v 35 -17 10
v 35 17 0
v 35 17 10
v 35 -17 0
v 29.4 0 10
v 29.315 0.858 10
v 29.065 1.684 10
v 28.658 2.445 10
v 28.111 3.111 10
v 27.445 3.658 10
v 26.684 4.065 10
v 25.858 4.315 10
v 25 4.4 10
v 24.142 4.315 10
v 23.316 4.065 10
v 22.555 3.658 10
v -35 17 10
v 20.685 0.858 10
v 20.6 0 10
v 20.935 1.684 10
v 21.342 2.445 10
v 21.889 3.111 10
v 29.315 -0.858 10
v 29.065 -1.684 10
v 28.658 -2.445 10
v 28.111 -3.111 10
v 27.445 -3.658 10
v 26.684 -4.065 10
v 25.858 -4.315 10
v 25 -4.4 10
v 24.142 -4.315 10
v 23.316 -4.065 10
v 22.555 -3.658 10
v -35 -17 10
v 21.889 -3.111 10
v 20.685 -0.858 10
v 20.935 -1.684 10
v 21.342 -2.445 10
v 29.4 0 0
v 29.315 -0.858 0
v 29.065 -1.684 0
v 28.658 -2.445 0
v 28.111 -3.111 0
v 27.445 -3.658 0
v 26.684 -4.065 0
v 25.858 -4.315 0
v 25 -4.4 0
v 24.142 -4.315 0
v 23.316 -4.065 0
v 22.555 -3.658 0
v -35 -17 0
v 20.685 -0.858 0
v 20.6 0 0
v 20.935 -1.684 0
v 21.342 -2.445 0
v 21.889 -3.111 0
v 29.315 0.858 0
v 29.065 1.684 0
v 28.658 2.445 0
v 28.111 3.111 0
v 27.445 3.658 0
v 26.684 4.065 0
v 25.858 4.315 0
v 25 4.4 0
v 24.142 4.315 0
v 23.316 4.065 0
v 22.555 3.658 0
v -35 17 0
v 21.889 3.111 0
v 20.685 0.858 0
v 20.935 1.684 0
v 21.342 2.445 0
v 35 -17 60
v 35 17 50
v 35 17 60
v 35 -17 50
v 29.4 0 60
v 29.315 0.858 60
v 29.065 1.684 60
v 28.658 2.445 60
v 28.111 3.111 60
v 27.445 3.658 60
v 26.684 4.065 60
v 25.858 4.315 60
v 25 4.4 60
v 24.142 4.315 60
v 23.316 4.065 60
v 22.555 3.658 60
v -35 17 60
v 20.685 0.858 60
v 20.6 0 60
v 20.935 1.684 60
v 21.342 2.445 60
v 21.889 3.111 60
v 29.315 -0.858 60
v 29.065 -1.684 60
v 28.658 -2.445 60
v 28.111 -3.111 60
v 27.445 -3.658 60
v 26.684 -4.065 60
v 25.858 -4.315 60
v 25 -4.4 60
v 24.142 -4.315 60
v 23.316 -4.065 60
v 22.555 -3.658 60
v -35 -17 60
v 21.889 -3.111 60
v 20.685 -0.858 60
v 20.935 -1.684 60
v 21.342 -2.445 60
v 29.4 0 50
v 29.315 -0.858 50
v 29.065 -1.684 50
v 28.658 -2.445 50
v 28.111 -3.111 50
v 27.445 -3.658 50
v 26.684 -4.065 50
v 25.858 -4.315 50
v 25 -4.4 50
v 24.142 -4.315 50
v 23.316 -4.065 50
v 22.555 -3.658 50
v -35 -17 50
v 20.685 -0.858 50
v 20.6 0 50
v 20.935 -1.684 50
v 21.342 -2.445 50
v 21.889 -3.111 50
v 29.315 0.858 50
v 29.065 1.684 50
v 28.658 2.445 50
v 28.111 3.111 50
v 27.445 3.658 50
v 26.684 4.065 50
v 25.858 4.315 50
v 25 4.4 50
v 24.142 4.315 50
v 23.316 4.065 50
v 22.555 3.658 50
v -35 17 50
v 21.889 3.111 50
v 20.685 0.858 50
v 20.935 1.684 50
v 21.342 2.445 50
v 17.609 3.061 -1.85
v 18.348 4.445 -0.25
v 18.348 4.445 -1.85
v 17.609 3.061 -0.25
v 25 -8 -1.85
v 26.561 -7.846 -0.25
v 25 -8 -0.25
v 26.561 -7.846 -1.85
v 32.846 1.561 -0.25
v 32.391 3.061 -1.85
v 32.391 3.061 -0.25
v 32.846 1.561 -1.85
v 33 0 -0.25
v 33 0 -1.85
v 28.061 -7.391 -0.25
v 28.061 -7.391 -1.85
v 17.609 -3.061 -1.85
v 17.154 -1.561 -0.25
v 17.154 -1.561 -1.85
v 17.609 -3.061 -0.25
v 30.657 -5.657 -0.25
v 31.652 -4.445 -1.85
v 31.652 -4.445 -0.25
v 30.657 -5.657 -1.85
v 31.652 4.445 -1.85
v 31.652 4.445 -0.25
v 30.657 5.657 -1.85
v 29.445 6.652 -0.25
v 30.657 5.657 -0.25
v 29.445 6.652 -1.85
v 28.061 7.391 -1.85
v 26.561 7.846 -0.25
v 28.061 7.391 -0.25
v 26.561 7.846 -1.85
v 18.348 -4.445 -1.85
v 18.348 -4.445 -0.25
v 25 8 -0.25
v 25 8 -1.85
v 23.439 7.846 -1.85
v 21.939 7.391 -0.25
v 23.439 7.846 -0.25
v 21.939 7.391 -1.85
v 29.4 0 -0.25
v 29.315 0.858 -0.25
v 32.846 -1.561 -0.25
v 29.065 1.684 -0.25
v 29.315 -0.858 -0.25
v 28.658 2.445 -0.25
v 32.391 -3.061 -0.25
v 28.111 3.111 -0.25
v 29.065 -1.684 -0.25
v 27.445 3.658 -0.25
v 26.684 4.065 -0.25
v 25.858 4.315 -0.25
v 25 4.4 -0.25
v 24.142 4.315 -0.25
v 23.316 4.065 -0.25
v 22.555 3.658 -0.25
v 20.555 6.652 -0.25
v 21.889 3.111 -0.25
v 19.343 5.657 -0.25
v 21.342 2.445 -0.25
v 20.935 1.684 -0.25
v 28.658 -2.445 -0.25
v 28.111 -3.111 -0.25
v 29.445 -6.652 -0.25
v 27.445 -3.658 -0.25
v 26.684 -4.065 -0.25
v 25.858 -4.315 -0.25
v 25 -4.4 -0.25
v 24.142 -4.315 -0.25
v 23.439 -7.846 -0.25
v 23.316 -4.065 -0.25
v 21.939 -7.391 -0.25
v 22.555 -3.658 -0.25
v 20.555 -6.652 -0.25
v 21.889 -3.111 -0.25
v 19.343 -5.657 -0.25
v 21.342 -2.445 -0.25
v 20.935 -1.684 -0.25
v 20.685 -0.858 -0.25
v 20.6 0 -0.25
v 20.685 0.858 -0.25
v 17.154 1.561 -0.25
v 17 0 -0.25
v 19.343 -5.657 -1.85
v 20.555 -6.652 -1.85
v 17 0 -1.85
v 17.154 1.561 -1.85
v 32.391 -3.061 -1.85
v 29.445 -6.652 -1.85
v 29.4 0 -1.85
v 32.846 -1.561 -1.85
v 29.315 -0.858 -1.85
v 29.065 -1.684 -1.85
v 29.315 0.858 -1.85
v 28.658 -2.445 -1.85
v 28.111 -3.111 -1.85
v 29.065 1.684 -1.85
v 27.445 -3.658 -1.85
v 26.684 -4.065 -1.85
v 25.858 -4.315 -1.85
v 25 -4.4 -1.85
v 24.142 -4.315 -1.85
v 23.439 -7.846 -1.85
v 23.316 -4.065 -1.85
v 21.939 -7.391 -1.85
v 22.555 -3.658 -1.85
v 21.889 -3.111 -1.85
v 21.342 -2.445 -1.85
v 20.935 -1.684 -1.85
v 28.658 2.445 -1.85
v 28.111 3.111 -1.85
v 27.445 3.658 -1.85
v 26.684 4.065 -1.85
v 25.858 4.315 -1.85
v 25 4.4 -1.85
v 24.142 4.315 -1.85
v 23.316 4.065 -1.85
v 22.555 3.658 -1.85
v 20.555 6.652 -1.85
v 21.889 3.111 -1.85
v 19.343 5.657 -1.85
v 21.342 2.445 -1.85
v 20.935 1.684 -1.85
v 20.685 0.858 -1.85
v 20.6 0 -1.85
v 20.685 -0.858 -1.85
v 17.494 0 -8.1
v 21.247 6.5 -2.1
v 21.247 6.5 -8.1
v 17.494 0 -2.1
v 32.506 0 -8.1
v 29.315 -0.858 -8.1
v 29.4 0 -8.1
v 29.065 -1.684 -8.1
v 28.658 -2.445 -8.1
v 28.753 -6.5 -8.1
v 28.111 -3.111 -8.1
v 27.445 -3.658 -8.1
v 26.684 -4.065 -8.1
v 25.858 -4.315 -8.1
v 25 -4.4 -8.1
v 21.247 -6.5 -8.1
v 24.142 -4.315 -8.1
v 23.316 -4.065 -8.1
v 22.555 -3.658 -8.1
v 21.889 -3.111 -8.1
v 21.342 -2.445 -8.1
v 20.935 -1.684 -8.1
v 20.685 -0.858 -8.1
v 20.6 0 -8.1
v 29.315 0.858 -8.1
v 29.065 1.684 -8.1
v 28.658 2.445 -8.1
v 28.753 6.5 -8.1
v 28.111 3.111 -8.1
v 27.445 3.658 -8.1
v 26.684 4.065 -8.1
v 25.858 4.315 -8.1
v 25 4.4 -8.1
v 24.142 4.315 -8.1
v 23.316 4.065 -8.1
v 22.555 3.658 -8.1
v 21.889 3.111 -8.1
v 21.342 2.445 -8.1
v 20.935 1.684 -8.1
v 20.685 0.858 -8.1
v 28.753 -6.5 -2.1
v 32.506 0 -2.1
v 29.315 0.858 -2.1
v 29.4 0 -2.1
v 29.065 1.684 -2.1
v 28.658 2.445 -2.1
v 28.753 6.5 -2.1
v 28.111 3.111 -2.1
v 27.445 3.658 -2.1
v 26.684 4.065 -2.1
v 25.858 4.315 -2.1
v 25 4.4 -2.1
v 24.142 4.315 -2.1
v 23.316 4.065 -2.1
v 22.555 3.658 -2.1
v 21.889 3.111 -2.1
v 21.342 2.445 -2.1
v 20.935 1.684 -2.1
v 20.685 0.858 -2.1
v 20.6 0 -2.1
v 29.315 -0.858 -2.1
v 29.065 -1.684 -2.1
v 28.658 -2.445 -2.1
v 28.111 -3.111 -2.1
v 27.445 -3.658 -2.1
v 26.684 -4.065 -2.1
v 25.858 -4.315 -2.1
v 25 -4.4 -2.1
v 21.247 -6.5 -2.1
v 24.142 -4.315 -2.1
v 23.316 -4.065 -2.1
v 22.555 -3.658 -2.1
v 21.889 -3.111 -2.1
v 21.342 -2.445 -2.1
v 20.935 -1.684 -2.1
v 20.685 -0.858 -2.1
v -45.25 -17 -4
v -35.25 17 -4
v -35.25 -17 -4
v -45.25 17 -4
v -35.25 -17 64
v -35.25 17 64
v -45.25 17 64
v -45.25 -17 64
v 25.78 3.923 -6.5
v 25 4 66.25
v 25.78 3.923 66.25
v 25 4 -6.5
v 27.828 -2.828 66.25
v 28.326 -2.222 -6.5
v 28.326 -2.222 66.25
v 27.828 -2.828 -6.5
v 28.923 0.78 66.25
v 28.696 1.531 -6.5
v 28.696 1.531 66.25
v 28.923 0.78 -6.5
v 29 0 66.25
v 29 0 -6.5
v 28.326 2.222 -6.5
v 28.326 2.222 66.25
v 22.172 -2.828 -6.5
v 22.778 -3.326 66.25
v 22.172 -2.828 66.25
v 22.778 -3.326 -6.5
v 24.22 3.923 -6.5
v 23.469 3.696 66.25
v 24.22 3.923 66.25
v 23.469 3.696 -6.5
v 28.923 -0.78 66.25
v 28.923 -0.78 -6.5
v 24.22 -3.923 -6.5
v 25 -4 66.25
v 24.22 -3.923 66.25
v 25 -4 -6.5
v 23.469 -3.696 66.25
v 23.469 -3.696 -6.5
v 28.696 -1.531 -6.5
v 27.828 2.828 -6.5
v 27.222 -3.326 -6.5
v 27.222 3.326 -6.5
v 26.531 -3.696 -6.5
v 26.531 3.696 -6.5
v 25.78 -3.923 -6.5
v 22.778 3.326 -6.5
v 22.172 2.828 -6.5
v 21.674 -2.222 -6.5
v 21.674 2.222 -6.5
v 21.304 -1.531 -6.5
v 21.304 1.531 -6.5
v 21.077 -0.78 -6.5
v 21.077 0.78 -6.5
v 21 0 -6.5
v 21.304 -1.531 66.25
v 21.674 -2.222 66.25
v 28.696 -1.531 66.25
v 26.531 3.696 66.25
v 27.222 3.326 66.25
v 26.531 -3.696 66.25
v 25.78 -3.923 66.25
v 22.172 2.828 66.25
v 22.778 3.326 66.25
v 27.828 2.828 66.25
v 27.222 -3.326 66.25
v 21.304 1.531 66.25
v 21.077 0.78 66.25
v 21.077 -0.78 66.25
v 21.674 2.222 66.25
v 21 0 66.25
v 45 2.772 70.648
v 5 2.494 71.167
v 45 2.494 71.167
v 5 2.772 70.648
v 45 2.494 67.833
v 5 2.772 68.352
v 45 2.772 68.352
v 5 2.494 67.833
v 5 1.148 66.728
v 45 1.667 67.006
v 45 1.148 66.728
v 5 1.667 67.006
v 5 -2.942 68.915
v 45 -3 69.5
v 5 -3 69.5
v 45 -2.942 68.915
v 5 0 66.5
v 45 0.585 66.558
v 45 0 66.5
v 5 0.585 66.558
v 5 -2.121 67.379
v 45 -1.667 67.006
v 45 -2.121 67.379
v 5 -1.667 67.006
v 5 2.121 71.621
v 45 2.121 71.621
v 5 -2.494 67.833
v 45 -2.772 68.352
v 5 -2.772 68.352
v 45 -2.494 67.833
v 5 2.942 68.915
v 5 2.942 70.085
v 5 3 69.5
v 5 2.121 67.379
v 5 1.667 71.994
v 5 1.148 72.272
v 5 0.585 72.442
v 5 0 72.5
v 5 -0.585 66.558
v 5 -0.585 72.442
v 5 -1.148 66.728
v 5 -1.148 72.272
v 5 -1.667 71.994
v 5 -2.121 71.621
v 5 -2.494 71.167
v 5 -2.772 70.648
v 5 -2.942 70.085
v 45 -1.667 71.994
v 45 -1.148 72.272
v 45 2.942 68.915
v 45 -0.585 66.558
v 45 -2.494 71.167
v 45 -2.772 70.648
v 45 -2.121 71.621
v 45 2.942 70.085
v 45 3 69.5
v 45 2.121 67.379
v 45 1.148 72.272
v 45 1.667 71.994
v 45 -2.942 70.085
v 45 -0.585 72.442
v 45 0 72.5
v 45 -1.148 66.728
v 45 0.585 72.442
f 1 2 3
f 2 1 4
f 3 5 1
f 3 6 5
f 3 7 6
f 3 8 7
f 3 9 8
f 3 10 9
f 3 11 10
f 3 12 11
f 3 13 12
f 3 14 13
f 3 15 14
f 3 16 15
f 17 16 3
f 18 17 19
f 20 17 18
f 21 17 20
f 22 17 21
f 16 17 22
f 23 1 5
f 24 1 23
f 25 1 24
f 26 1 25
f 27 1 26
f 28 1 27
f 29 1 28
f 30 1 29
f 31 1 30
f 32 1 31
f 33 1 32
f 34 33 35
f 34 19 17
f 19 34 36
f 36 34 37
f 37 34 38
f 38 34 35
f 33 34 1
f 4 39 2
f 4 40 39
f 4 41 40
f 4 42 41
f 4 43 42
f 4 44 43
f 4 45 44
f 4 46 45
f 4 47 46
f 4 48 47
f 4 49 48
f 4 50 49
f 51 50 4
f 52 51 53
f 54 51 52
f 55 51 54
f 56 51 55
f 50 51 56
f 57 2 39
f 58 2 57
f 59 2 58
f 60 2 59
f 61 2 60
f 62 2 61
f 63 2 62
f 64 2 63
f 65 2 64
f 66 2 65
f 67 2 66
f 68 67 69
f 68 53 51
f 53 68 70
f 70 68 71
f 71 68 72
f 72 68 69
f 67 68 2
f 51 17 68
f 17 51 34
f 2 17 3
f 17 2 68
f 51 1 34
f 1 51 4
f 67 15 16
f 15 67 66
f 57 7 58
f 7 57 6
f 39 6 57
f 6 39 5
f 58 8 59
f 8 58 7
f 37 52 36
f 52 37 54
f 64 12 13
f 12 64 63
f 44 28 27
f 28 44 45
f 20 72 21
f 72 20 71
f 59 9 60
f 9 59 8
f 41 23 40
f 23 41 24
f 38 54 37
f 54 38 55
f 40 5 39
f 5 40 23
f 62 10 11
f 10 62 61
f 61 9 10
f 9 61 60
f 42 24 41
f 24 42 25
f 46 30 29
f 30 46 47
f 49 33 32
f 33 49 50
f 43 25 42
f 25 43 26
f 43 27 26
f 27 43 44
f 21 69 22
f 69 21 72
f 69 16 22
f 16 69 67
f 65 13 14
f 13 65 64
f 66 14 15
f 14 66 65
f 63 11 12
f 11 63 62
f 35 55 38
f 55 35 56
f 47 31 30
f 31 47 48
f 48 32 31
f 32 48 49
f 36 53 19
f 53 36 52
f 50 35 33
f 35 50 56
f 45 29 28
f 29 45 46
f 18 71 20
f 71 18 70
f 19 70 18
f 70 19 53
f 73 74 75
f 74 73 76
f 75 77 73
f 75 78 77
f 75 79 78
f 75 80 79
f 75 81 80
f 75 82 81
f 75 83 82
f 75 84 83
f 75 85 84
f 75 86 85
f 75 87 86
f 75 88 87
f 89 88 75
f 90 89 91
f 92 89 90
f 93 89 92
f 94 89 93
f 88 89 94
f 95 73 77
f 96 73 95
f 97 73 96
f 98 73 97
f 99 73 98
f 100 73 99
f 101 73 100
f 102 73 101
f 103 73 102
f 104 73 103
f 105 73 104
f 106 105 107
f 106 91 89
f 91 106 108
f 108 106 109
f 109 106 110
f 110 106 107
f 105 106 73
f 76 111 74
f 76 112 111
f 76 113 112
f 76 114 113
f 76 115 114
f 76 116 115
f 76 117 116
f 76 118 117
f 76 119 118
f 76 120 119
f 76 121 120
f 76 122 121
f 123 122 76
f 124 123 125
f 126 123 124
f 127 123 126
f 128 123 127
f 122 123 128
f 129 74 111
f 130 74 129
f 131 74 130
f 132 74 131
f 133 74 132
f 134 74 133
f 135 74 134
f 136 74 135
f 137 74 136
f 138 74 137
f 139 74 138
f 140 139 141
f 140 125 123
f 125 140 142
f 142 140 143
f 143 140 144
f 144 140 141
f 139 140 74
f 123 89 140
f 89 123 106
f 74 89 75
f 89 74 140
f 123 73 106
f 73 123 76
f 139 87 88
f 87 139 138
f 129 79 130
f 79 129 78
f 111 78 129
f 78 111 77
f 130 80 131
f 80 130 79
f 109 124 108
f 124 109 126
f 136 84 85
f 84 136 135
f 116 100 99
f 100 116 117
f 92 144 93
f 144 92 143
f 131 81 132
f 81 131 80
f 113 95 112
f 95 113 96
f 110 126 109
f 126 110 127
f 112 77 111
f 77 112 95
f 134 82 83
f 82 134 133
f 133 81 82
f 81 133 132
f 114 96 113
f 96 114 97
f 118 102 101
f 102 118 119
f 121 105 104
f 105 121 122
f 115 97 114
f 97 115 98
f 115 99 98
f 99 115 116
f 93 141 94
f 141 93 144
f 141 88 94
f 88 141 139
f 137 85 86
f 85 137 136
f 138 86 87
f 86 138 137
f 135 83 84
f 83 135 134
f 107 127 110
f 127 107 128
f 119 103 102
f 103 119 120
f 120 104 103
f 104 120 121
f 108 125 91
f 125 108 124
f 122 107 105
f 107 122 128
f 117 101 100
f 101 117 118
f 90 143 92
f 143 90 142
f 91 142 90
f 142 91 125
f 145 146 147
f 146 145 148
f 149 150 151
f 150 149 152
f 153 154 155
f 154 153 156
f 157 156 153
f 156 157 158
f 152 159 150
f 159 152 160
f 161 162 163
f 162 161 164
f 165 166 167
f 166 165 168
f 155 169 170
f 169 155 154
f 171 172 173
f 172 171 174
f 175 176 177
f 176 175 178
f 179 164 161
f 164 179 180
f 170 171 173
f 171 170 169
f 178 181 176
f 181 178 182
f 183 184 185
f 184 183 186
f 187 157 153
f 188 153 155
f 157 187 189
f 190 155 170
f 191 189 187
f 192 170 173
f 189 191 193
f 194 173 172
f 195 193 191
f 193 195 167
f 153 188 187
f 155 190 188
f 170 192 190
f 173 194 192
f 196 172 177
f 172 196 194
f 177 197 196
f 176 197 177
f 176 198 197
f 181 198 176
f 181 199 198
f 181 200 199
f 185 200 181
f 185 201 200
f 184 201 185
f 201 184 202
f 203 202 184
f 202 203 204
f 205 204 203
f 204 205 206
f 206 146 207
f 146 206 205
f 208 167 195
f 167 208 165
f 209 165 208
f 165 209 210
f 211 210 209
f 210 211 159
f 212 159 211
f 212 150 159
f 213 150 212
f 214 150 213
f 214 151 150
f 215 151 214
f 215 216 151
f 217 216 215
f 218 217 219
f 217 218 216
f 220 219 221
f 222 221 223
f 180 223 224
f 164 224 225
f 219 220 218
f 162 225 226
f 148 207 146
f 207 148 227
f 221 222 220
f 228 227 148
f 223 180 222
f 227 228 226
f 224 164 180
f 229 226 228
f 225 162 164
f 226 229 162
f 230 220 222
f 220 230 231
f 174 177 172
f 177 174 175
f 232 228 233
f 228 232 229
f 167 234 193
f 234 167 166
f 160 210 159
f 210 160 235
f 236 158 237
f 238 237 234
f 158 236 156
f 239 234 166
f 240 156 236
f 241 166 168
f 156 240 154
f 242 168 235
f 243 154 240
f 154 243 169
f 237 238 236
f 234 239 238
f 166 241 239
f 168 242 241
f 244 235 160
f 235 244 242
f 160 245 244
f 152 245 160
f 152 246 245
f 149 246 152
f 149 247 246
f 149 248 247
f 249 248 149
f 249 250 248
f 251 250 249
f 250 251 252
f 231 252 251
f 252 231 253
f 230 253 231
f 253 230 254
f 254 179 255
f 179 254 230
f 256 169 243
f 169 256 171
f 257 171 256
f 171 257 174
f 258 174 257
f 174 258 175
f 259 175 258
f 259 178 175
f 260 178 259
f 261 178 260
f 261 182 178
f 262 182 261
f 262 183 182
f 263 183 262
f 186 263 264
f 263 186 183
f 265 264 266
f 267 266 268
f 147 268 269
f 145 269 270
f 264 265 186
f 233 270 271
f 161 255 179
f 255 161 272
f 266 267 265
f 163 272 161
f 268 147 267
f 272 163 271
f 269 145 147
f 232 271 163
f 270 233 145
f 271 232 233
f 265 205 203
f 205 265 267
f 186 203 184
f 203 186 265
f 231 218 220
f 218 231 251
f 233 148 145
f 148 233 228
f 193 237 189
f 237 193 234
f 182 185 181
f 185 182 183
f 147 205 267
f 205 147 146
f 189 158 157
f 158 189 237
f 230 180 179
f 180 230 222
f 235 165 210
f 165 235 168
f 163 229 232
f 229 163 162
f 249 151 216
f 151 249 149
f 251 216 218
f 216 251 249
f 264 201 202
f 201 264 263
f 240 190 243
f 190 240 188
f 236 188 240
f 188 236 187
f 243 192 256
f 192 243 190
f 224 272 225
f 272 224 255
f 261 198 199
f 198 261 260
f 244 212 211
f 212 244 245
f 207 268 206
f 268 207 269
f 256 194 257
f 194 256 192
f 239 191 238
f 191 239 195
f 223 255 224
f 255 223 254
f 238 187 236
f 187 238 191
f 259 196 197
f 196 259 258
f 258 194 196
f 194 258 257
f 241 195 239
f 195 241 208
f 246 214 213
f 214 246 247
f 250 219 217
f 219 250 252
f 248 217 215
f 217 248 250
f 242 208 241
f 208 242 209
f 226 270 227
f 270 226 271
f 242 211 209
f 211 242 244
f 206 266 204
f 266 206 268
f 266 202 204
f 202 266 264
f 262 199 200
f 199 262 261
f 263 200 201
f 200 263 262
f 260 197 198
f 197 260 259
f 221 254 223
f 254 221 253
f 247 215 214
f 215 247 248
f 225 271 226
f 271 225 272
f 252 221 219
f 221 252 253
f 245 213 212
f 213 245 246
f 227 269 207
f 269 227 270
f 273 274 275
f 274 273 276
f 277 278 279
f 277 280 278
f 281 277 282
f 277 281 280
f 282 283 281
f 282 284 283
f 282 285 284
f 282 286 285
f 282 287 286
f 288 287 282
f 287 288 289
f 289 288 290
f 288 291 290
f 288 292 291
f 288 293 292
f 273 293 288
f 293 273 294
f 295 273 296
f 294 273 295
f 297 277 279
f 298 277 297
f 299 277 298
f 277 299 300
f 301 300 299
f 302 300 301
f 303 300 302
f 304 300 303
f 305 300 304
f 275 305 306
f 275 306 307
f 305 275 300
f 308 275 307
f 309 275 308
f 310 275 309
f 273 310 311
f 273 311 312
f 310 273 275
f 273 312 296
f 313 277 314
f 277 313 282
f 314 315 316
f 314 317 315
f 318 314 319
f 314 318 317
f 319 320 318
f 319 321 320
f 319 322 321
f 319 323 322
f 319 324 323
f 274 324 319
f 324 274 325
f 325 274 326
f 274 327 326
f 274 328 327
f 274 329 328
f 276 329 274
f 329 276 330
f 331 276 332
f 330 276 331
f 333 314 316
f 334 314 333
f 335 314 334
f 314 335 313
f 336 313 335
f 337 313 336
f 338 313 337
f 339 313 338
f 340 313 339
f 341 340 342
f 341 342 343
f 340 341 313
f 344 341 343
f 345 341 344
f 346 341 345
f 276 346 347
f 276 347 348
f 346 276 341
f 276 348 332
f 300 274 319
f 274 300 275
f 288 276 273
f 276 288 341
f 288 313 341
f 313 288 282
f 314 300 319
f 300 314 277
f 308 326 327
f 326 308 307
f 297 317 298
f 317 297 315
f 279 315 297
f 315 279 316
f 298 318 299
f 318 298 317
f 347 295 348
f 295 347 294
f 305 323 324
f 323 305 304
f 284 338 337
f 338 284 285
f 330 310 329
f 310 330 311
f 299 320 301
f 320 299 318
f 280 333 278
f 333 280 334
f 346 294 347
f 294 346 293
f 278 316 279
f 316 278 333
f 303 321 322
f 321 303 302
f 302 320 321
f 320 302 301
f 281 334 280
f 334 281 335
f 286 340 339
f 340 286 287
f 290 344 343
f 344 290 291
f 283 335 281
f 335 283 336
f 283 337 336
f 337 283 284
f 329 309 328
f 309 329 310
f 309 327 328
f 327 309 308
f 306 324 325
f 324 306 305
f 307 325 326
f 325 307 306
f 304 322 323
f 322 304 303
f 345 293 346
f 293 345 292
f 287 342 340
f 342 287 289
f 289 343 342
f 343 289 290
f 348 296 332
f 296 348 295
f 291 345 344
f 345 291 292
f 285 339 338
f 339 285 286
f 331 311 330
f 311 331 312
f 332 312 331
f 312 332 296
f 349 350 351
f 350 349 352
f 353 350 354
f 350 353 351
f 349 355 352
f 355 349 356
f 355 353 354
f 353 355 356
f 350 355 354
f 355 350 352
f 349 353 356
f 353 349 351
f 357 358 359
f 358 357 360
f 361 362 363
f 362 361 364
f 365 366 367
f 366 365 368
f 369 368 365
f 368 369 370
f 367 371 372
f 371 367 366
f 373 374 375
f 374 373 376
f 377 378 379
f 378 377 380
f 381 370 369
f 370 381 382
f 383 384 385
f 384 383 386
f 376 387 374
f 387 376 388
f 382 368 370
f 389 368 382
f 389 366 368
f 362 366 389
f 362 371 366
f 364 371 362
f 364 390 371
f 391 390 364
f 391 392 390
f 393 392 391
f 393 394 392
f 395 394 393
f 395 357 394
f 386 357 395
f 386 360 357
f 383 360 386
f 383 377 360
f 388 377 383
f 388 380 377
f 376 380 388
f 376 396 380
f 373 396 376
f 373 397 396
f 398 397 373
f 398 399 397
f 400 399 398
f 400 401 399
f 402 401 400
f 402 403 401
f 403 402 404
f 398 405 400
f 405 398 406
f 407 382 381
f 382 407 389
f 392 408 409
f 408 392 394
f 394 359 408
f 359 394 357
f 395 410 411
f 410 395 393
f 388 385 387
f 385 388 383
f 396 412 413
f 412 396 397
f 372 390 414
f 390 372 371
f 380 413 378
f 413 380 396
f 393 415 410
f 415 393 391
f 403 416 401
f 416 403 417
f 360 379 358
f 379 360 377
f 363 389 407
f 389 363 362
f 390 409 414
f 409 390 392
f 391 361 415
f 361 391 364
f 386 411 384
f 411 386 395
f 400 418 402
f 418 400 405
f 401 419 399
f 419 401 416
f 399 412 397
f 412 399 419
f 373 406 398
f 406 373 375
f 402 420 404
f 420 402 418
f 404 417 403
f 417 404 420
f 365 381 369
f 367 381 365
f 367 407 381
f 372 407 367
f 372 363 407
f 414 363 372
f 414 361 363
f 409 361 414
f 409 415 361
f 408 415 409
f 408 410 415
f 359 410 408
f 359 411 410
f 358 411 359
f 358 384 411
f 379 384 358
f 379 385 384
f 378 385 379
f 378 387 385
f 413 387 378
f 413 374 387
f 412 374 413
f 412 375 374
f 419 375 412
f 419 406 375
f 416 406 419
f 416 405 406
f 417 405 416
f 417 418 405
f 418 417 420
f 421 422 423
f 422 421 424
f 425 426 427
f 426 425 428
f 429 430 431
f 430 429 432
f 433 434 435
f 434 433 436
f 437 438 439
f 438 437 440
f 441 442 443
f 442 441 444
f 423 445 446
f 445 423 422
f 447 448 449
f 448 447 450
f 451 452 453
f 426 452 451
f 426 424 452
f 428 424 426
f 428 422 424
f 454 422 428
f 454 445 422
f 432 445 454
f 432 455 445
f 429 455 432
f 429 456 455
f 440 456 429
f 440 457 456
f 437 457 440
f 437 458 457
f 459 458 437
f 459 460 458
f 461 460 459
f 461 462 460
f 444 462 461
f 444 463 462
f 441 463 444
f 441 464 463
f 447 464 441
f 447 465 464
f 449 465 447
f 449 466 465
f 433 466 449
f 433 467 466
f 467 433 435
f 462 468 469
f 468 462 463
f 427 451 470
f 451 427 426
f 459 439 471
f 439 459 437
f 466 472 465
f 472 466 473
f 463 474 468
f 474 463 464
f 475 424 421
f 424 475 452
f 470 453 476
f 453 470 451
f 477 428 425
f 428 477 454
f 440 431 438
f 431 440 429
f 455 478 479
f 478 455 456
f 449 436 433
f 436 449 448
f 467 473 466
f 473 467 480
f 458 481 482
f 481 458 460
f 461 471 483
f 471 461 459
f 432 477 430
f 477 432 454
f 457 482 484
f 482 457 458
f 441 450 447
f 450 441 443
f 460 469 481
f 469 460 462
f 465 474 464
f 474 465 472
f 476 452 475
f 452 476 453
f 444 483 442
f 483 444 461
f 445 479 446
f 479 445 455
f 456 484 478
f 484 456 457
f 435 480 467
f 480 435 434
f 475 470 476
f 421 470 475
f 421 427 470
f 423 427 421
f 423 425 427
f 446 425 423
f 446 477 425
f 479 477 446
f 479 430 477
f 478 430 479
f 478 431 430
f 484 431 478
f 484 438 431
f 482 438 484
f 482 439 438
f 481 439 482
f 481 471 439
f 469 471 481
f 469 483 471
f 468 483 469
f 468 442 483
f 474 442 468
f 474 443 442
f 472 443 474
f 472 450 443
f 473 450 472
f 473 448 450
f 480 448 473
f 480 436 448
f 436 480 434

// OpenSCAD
$fn = 32;

// ------------------------------------------------------------------------
// C clamp: throat 50 mm, screw d8
// Every part is its own module, assembly() places every instance.
// ------------------------------------------------------------------------

// --- part 1 ---
module clamp_arm() {
  difference() {
    translate([-35, -17, 0]) cube([70, 34, 10]);
    translate([25, 0, -1]) cylinder(h = 12, d = 8.8);
  }
}

// --- part 2 ---
module clamp_spine() {
  difference() {
    translate([-34, -17, 0]) cube([68, 34, 10]);
  }
}

// --- part 3 ---
module clamp_screw() {
  translate([0, 0, -36.375]) cylinder(h = 72.75, d = 8);
}

// --- part 4 ---
module clamp_washer() {
  difference() {
      translate([0, 0, 0]) cylinder(h = 1.6, d = 16);
      translate([0, 0, -1]) cylinder(h = 3.6, d = 8.8);
    }
}

// --- part 5 ---
module clamp_nut() {
  difference() {
    linear_extrude(height = 6) polygon(points = [[7.506, 0], [3.753, 6.5], [-3.753, 6.5], [-7.506, 0], [-3.753, -6.5], [3.753, -6.5]]);
    translate([0, 0, -1]) cylinder(h = 8, d = 8.8);
  }
}

// --- part 6 ---
module tommy_bar() {
  translate([0, 0, -20]) cylinder(h = 40, d = 6);
}

// --- assembly ---
module assembly() {
  color([0.80, 0.24, 0.20]) translate([0, 0, 0]) rotate([0, 0, 0]) clamp_arm();
  color([0.20, 0.45, 0.75]) translate([0, 0, 50]) rotate([0, 0, 0]) clamp_arm();
  color([0.25, 0.62, 0.32]) translate([-45.25, 0, 30]) rotate([0, 90, 0]) clamp_spine();
  color([0.92, 0.70, 0.18]) translate([25, 0, 29.875]) rotate([0, 0, 0]) clamp_screw();
  color([0.58, 0.35, 0.70]) translate([25, 0, -1.85]) rotate([0, 0, 0]) clamp_washer();
  color([0.16, 0.66, 0.66]) translate([25, 0, -8.1]) rotate([0, 0, 0]) clamp_nut();
  color([0.85, 0.48, 0.18]) translate([25, 0, 69.5]) rotate([0, 90, 0]) tommy_bar();
}

assembly();
